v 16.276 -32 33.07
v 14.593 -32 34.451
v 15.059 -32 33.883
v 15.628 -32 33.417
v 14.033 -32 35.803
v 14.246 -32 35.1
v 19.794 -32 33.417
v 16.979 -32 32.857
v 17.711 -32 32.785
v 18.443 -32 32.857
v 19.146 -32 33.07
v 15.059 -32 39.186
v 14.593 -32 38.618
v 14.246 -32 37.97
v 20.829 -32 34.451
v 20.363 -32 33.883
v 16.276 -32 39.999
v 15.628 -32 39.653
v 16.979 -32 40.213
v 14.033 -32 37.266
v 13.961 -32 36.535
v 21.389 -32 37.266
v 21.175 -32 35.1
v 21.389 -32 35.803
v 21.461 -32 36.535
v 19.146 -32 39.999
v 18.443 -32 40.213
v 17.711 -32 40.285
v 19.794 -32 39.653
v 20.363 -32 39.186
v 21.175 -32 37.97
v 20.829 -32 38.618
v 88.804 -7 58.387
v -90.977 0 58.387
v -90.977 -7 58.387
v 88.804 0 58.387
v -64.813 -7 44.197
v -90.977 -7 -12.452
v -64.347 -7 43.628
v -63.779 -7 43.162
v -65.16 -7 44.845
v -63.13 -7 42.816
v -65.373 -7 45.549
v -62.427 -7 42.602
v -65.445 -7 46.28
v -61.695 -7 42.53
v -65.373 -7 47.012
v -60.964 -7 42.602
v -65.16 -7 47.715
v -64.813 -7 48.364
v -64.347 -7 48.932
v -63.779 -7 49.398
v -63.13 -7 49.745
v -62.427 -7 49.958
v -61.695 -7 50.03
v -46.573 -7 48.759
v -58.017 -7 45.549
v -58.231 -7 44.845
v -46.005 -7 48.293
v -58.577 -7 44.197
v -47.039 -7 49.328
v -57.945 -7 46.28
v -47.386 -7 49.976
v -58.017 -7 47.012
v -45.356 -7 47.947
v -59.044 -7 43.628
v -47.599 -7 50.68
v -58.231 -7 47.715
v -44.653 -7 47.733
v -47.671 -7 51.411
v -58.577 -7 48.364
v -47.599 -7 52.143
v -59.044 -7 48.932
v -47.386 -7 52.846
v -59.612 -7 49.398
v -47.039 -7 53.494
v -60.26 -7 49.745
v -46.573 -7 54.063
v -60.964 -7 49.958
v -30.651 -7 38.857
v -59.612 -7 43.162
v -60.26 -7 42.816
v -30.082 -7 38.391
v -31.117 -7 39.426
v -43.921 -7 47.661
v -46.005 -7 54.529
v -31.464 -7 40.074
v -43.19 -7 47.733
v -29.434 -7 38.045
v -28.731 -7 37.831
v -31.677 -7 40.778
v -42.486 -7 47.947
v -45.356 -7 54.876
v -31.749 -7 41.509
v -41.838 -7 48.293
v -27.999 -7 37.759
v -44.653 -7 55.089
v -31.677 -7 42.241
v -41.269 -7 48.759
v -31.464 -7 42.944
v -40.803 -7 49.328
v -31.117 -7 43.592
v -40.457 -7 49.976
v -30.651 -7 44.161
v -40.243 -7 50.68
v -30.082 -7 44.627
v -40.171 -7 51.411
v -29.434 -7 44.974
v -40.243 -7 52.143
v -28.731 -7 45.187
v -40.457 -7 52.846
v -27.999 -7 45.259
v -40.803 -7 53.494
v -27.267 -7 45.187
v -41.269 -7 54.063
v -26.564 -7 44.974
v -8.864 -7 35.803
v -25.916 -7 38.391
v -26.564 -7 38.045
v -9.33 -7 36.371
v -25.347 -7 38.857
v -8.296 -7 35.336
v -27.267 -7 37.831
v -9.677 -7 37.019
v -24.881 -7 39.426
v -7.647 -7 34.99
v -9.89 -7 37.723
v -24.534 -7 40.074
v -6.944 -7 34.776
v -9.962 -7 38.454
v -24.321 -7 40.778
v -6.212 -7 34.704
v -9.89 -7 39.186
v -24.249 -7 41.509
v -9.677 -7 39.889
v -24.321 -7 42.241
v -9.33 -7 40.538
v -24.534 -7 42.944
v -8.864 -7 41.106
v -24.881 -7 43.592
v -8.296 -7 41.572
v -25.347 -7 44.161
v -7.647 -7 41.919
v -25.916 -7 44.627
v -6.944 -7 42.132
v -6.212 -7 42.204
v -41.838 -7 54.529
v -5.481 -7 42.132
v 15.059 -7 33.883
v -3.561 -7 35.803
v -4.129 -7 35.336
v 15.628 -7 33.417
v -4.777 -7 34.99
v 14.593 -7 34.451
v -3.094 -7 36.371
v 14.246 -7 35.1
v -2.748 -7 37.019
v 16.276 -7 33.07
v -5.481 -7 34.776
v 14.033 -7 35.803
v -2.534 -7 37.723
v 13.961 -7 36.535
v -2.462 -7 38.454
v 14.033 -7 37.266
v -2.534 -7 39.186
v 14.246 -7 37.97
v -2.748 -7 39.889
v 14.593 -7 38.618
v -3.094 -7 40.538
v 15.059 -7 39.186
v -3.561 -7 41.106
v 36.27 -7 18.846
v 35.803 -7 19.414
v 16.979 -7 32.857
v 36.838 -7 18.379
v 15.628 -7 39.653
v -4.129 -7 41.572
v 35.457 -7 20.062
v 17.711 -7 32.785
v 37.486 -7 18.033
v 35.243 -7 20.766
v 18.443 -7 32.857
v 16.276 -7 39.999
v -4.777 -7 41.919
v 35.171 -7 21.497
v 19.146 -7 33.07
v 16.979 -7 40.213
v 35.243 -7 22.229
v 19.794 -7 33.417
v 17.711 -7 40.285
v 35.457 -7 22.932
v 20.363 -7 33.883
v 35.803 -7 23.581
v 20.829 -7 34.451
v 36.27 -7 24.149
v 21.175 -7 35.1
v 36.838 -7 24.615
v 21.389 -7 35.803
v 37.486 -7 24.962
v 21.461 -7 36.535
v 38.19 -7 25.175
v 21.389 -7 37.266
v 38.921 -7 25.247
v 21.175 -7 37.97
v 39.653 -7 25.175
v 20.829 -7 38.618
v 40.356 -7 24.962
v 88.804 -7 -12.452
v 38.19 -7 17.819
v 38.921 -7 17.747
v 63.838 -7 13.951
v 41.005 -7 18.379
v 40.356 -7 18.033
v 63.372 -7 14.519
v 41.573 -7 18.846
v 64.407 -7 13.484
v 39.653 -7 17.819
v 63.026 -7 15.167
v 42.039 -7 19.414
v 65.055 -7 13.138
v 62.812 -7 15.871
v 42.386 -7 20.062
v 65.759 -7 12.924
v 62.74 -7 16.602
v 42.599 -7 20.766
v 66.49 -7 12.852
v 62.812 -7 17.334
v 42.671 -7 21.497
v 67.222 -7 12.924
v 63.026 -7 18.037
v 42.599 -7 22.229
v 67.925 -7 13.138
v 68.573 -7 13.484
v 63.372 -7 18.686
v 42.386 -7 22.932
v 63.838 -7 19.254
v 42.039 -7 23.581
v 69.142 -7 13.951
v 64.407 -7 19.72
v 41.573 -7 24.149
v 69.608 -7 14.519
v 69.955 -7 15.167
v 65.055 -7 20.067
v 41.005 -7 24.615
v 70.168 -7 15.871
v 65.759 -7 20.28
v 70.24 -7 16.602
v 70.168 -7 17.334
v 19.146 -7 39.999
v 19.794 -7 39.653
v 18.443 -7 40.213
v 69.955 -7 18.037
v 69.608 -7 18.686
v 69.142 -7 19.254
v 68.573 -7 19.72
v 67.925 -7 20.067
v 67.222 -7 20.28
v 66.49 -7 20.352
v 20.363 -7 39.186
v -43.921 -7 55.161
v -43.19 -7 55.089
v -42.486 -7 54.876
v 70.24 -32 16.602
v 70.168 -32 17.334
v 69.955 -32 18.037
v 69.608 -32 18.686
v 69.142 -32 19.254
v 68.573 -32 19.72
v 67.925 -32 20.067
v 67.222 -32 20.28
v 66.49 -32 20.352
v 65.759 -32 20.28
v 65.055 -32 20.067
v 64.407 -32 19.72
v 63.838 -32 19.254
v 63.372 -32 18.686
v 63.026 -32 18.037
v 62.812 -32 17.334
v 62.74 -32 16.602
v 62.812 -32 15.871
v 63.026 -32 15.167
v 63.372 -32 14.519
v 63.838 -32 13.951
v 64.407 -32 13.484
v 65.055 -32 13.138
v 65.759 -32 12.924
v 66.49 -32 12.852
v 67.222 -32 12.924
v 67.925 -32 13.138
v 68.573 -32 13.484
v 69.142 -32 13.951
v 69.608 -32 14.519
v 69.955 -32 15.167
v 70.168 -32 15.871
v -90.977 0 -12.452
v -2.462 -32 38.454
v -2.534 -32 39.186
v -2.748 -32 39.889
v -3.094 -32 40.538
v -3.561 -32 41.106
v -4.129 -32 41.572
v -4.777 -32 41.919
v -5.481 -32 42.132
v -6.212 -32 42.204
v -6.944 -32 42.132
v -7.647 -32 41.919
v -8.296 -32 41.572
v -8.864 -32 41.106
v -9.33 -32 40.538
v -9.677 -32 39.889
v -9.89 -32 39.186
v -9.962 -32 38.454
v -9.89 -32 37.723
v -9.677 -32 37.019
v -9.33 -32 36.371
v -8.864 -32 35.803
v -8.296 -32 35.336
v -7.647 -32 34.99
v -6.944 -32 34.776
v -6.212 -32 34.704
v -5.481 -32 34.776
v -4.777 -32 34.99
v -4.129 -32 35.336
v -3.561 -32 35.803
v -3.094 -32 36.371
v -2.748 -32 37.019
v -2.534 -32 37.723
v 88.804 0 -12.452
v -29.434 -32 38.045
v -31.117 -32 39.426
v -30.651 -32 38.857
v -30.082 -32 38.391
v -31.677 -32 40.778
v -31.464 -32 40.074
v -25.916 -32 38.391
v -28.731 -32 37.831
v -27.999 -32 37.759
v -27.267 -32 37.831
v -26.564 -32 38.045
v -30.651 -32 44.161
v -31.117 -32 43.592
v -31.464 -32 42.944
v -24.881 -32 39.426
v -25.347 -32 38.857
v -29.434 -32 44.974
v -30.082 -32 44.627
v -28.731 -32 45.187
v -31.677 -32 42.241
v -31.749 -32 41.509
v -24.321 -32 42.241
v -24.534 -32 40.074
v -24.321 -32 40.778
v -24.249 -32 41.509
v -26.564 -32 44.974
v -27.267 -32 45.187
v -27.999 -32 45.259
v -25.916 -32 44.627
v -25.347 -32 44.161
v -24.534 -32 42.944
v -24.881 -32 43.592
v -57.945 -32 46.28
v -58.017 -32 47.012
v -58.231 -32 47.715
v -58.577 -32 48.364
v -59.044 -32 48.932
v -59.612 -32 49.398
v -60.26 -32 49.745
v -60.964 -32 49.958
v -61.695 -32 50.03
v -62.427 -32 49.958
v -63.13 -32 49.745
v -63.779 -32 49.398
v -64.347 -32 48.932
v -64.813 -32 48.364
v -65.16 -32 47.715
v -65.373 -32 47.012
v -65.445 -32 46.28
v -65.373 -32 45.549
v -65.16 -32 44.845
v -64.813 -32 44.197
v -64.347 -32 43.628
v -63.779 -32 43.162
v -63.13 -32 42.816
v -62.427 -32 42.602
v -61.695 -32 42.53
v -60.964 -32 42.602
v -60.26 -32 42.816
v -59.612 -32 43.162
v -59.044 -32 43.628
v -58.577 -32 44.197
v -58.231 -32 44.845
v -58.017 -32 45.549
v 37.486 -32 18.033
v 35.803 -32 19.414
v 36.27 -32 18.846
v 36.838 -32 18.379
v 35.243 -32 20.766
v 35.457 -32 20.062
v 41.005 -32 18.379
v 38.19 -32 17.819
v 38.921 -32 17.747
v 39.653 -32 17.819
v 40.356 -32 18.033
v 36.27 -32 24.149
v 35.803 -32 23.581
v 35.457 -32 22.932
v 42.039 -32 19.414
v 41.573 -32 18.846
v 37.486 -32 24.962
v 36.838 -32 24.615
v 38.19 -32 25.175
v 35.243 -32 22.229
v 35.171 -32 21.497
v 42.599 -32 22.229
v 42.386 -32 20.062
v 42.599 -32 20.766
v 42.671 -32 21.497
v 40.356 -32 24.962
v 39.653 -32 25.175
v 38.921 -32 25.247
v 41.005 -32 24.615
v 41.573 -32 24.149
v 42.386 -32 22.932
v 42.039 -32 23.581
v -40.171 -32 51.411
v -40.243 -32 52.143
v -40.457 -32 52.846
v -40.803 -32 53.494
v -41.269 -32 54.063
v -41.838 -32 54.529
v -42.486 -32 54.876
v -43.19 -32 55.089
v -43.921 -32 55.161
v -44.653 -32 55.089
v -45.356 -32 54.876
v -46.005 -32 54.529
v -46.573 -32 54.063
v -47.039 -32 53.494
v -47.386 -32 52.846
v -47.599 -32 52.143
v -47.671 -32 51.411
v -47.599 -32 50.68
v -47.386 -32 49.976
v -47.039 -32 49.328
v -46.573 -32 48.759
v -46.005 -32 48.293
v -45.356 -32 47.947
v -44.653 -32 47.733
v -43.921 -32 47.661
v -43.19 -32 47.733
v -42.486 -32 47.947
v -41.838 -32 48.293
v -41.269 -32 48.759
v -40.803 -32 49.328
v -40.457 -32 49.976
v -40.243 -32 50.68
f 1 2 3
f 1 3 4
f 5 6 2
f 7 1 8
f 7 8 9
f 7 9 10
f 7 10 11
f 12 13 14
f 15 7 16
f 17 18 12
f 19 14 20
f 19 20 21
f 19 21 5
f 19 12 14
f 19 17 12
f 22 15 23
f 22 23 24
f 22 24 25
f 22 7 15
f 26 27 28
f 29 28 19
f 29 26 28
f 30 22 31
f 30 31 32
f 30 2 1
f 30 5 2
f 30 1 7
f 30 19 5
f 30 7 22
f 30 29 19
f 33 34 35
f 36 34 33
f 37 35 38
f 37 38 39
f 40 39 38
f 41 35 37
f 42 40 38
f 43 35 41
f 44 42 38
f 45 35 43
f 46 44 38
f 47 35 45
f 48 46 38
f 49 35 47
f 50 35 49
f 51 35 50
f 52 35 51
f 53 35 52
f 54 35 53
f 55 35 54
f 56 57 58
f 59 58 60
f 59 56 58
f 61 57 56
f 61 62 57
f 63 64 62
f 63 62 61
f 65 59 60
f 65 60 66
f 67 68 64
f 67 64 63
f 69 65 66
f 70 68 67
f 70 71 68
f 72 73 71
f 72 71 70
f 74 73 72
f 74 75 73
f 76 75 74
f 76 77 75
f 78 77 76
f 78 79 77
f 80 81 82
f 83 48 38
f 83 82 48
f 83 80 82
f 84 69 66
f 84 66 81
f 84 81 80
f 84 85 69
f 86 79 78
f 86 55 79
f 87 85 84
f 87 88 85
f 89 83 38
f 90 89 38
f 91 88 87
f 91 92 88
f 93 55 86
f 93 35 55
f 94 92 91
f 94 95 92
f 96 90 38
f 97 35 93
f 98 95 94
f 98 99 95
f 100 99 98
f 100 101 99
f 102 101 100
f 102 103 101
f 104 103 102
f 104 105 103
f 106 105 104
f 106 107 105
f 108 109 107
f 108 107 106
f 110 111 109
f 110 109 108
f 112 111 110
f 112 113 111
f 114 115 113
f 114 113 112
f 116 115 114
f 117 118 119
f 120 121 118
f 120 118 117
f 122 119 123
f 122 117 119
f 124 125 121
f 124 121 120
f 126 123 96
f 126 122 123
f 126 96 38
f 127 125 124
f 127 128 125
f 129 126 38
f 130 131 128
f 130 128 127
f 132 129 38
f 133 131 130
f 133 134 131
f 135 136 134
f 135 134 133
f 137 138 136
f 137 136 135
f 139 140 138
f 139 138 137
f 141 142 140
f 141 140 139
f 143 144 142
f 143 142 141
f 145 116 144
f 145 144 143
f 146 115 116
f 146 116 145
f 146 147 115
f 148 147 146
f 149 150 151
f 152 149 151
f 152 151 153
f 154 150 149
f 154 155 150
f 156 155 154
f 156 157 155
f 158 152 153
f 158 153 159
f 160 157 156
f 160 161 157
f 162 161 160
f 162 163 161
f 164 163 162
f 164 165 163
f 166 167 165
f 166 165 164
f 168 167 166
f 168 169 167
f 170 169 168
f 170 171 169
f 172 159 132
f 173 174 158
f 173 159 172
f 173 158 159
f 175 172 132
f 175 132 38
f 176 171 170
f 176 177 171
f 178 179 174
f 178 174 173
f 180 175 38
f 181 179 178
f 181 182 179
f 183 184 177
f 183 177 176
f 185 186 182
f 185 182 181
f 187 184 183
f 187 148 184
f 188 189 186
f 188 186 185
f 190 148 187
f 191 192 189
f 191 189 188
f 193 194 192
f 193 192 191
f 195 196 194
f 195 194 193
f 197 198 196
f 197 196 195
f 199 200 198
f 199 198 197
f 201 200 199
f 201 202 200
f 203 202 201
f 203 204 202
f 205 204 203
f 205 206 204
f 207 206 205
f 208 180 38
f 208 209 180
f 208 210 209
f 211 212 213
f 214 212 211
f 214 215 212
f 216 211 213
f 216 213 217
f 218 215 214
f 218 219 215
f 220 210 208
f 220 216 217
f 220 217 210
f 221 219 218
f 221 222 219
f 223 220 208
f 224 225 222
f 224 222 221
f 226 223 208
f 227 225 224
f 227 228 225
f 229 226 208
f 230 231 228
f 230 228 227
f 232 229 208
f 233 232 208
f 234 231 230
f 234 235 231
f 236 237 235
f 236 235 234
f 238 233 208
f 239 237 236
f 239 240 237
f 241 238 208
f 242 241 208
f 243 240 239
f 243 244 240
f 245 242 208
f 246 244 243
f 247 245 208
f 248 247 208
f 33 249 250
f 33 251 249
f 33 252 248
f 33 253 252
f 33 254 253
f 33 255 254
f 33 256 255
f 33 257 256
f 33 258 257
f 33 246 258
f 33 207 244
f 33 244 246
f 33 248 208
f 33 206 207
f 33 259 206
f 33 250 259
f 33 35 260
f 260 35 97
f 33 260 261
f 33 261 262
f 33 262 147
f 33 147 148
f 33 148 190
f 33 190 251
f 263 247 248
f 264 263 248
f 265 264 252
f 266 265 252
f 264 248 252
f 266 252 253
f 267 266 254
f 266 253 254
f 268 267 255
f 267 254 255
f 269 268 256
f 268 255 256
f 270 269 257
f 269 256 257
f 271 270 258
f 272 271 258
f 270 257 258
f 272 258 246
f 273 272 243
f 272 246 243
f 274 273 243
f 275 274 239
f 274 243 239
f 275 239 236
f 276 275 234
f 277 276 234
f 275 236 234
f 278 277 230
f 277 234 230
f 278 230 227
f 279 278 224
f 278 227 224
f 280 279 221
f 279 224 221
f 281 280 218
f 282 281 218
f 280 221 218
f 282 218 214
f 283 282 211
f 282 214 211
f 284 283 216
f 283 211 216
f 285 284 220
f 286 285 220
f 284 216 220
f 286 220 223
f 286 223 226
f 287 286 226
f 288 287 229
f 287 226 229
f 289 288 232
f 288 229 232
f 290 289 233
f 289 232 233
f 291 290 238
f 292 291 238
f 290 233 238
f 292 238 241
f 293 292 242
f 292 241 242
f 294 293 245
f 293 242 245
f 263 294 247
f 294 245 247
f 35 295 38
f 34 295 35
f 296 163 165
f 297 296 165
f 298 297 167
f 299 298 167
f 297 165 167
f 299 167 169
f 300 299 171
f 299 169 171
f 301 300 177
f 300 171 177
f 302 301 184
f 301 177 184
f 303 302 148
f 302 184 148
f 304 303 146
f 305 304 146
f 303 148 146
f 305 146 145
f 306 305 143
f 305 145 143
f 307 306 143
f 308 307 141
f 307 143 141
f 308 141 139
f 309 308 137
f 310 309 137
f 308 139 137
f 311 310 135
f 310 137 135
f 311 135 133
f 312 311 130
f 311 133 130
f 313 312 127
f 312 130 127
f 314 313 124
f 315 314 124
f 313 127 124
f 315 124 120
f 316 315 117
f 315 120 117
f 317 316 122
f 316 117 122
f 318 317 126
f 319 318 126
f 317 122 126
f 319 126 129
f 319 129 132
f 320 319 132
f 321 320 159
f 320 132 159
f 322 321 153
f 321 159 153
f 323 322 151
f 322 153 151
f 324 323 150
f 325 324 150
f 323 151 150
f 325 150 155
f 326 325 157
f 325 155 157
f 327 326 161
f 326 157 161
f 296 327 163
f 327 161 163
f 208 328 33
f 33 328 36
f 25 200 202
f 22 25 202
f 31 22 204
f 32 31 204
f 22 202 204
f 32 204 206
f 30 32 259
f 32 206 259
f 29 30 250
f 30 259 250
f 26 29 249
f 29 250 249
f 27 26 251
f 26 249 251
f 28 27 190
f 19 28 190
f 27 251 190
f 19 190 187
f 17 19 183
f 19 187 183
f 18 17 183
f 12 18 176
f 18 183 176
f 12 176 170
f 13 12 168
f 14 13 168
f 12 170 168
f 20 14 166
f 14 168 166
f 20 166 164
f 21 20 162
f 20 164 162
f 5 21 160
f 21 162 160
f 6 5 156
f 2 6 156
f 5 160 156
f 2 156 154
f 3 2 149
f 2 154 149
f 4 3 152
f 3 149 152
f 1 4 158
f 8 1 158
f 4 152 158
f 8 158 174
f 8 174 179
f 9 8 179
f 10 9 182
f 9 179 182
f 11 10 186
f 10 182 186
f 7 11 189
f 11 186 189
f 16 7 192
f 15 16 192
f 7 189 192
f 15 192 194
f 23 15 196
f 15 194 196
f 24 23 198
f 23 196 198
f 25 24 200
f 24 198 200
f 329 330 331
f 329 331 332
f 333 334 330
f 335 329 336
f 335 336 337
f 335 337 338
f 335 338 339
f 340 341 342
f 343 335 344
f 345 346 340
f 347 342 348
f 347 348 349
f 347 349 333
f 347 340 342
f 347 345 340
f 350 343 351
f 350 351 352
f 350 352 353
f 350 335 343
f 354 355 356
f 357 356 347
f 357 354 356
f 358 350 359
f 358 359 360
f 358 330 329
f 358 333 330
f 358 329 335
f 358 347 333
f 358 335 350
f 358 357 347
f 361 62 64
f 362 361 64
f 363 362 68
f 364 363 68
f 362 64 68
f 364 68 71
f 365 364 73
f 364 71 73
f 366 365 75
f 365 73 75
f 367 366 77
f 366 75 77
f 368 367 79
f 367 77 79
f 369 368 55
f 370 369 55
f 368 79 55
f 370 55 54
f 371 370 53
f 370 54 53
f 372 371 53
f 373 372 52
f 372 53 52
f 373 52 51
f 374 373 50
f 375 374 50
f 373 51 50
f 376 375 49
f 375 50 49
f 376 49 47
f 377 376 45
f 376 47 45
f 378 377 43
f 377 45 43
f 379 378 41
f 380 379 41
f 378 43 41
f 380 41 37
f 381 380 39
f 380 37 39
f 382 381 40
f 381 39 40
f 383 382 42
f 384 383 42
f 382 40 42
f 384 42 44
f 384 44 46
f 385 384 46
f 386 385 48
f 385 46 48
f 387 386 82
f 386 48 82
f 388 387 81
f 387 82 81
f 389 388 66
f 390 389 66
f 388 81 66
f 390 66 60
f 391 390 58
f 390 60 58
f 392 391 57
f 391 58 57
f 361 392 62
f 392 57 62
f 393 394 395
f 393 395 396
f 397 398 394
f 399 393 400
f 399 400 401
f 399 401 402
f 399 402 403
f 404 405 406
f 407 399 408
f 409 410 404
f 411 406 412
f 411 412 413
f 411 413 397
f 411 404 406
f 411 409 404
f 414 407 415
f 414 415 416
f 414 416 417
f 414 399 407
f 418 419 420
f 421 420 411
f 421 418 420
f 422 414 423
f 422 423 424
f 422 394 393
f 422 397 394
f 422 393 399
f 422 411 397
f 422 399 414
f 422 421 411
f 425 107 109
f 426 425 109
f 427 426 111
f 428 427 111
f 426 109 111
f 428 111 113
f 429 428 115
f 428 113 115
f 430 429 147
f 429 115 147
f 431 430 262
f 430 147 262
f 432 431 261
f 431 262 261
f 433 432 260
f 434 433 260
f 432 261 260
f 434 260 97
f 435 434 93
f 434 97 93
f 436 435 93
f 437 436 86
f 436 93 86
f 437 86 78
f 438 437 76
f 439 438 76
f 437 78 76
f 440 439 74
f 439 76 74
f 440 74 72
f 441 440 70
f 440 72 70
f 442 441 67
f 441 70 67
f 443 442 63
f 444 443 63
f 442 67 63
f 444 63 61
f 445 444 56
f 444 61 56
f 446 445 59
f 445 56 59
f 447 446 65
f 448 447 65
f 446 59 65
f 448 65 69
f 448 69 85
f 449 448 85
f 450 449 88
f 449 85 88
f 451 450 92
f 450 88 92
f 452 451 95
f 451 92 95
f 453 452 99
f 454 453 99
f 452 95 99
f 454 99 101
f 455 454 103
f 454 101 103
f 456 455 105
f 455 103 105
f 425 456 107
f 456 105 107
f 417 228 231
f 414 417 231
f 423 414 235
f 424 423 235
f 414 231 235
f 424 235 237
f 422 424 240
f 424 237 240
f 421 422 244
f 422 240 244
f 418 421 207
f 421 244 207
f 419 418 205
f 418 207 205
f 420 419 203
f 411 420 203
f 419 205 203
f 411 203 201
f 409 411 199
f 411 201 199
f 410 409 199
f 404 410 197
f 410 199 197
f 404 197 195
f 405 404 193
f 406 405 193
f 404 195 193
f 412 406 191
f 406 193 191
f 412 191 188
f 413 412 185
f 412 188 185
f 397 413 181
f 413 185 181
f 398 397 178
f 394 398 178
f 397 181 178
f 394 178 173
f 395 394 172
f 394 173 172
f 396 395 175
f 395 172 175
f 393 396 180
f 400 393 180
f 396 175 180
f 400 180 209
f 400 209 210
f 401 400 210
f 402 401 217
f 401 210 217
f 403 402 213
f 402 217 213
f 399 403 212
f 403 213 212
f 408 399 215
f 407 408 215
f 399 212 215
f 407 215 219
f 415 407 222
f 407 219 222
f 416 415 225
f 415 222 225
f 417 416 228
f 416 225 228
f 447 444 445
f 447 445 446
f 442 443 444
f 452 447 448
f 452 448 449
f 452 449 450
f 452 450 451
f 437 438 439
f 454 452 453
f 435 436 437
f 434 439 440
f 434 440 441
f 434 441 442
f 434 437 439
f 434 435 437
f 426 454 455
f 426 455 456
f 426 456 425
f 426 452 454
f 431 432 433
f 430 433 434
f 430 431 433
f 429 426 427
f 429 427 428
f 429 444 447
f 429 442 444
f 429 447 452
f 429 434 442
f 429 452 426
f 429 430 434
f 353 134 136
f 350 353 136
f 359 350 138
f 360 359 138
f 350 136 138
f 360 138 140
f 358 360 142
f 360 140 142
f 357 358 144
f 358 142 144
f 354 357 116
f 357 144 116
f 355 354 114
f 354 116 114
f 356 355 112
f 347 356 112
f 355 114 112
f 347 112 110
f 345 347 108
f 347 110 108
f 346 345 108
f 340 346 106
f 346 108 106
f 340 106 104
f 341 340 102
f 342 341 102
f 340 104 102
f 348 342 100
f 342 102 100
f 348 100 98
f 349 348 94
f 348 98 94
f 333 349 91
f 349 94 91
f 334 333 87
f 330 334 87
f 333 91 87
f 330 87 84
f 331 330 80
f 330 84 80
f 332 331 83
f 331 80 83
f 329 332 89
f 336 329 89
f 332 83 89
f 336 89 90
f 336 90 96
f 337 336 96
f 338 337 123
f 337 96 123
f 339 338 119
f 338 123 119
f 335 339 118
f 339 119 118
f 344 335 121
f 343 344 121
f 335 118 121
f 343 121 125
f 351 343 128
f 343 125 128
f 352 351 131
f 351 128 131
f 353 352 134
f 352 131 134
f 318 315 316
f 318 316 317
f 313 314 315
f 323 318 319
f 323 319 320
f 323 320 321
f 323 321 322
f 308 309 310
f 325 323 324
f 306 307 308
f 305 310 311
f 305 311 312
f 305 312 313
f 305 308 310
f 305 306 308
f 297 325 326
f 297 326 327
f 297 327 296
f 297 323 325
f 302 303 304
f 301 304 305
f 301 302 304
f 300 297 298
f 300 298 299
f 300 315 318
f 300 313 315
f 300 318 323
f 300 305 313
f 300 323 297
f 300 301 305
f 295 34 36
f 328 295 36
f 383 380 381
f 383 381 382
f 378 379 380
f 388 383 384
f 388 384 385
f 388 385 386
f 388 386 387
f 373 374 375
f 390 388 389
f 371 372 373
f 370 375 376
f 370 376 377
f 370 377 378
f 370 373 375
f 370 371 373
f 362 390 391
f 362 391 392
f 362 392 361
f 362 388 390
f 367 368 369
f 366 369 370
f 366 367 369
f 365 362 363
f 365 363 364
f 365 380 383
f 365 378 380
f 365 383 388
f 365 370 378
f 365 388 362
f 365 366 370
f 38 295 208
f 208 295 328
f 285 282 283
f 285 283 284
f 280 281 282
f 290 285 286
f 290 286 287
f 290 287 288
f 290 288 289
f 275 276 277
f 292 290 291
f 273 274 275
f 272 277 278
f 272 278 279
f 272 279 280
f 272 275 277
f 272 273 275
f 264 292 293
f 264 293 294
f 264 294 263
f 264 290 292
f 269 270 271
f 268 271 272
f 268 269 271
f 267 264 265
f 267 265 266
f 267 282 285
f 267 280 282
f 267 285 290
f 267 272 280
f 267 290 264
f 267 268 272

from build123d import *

# Parameters (mm, degrees)
F0_W      = 179.780744
F0_H      = 70.839242
F1_DEPTH  = 7
F2_R      = 3.75
F3_DEPTH  = 25
F4_R      = 3.75
F5_DEPTH  = 25
F6_R      = 3.75
F7_DEPTH  = 25
F8_R      = 3.75
F9_DEPTH  = 25
F10_R     = 3.75
F11_DEPTH = 25
F12_R     = 3.75
F13_DEPTH = 25
F14_R     = 3.75
F15_DEPTH = 25


with BuildPart() as f1:
    # F0 (on Front) → F1 (new body)
    with BuildSketch(Plane.XZ):
        with Locations((-1.086671, 22.967793)):
            Rectangle(F0_W, F0_H)
    extrude(amount=F1_DEPTH)

    # F2 (on face) → F3 (join)
    with BuildSketch(Plane.XZ.offset(7)):
        with Locations((-61.695352, 46.280116)):
            Circle(F2_R)
    extrude(amount=F3_DEPTH)

    # F4 (on face) → F5 (join)
    with BuildSketch(Plane.XZ.offset(7)):
        with Locations((-43.921127, 51.411094)):
            Circle(F4_R)
    extrude(amount=F5_DEPTH)

    # F6 (on face) → F7 (join)
    with BuildSketch(Plane.XZ.offset(7)):
        with Locations((-27.999029, 41.509111)):
            Circle(F6_R)
    extrude(amount=F7_DEPTH)

    # F8 (on face) → F9 (join)
    with BuildSketch(Plane.XZ.offset(7)):
        with Locations((-6.212159, 38.454227)):
            Circle(F8_R)
    extrude(amount=F9_DEPTH)

    # F10 (on face) → F11 (join)
    with BuildSketch(Plane.XZ.offset(7)):
        with Locations((17.710951, 36.534646)):
            Circle(F10_R)
    extrude(amount=F11_DEPTH)

    # F12 (on face) → F13 (join)
    with BuildSketch(Plane.XZ.offset(7)):
        with Locations((38.921294, 21.497313)):
            Circle(F12_R)
    extrude(amount=F13_DEPTH)

    # F14 (on face) → F15 (join)
    with BuildSketch(Plane.XZ.offset(7)):
        with Locations((66.4901, 16.602323)):
            Circle(F14_R)
    extrude(amount=F15_DEPTH)


solid = f1.part
